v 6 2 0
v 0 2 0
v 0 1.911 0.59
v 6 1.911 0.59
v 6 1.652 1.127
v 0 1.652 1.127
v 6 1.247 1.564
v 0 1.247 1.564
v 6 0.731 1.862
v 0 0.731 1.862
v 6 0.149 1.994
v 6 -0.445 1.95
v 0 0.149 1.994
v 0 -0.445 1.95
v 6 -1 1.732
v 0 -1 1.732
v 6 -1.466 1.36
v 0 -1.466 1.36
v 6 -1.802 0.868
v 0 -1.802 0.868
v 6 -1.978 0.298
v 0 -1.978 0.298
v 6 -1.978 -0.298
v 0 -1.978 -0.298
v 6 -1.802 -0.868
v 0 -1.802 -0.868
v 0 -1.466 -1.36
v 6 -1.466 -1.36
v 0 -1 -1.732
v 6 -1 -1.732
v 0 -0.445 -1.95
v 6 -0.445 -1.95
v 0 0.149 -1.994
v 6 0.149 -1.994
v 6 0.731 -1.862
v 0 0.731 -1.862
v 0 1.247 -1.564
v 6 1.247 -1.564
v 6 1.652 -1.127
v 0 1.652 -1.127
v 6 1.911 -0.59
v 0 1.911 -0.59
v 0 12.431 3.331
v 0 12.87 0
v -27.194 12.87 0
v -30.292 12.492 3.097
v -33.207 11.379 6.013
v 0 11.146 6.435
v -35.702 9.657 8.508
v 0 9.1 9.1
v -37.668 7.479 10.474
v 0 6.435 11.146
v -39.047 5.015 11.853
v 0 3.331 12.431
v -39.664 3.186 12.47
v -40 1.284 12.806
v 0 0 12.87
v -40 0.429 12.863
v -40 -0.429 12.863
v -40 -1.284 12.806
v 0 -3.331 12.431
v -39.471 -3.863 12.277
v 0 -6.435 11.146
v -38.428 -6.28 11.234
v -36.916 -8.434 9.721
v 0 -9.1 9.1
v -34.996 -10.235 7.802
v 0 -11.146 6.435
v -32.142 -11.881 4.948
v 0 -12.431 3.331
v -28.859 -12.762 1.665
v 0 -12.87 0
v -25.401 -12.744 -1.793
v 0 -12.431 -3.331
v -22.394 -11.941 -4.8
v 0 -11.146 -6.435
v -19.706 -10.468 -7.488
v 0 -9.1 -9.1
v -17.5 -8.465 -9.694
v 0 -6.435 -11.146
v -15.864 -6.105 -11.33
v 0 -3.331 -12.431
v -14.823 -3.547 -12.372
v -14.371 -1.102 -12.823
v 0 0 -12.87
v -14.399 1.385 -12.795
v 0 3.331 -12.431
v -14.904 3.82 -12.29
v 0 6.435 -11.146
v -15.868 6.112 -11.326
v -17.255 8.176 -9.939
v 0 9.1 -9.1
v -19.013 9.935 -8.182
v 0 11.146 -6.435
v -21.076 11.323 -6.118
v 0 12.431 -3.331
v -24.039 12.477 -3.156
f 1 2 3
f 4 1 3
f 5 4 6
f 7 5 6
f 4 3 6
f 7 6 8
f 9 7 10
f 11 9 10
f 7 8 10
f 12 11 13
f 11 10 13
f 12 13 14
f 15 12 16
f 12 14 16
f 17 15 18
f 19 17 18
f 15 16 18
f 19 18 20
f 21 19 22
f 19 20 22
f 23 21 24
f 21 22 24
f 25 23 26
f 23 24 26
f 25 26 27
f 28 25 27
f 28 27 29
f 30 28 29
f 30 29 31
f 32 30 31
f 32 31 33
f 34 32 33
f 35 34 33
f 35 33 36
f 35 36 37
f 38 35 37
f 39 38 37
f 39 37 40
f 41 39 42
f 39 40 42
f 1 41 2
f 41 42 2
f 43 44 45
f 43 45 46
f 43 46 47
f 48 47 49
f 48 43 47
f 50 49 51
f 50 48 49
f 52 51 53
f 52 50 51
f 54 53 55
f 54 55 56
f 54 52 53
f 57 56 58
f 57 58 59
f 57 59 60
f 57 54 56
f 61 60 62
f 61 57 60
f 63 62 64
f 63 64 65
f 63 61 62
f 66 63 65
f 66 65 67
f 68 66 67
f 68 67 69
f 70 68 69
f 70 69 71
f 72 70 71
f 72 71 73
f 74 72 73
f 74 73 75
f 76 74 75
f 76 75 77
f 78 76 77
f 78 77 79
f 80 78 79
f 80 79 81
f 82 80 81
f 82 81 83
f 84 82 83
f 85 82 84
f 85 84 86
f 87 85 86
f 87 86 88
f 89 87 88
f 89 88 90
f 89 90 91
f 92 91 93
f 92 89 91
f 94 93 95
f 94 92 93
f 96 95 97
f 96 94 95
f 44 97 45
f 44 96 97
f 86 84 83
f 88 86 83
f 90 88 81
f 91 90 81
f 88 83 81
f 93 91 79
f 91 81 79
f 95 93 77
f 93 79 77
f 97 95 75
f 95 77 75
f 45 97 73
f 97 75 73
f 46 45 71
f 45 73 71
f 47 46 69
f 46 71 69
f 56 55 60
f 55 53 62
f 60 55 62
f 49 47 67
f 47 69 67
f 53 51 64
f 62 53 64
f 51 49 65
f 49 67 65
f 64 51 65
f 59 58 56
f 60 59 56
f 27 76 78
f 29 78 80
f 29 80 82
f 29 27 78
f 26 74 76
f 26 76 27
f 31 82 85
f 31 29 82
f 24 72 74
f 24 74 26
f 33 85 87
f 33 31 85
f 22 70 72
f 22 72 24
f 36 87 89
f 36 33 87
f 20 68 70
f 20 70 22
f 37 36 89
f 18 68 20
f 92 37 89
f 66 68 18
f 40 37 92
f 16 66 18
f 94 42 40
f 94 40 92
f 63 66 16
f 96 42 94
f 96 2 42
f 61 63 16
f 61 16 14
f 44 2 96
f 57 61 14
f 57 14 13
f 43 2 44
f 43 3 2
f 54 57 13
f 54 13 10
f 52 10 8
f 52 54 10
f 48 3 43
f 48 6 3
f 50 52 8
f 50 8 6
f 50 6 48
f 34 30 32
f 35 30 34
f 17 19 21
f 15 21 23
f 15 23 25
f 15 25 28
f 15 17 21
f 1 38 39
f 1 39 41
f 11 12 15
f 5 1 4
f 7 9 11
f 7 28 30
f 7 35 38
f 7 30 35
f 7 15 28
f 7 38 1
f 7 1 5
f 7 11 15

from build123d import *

# Parameters (mm, degrees)
F0_R     = 12.87
F1_DEPTH = 40
F3_DEPTH = 15
F4_R     = 2
F5_DEPTH = 6


with BuildPart() as f1:
    # F0 (on Right) → F1 (new body)
    with BuildSketch(Plane.YZ):
        Circle(F0_R)
    extrude(amount=-F1_DEPTH)

    # F2 (on Front) → F3 (cut, symmetric)
    with BuildSketch(Plane.XZ):
        Polygon((-14.022035, -13.172213), (-40.083185, 12.888939), (-40.083185, -13.172213), align=None)
    extrude(amount=F3_DEPTH, both=True, mode=Mode.SUBTRACT)

    # F4 (on face) → F5 (join)
    with BuildSketch(Plane.YZ):
        Circle(F4_R)
    extrude(amount=F5_DEPTH)


solid = f1.part
